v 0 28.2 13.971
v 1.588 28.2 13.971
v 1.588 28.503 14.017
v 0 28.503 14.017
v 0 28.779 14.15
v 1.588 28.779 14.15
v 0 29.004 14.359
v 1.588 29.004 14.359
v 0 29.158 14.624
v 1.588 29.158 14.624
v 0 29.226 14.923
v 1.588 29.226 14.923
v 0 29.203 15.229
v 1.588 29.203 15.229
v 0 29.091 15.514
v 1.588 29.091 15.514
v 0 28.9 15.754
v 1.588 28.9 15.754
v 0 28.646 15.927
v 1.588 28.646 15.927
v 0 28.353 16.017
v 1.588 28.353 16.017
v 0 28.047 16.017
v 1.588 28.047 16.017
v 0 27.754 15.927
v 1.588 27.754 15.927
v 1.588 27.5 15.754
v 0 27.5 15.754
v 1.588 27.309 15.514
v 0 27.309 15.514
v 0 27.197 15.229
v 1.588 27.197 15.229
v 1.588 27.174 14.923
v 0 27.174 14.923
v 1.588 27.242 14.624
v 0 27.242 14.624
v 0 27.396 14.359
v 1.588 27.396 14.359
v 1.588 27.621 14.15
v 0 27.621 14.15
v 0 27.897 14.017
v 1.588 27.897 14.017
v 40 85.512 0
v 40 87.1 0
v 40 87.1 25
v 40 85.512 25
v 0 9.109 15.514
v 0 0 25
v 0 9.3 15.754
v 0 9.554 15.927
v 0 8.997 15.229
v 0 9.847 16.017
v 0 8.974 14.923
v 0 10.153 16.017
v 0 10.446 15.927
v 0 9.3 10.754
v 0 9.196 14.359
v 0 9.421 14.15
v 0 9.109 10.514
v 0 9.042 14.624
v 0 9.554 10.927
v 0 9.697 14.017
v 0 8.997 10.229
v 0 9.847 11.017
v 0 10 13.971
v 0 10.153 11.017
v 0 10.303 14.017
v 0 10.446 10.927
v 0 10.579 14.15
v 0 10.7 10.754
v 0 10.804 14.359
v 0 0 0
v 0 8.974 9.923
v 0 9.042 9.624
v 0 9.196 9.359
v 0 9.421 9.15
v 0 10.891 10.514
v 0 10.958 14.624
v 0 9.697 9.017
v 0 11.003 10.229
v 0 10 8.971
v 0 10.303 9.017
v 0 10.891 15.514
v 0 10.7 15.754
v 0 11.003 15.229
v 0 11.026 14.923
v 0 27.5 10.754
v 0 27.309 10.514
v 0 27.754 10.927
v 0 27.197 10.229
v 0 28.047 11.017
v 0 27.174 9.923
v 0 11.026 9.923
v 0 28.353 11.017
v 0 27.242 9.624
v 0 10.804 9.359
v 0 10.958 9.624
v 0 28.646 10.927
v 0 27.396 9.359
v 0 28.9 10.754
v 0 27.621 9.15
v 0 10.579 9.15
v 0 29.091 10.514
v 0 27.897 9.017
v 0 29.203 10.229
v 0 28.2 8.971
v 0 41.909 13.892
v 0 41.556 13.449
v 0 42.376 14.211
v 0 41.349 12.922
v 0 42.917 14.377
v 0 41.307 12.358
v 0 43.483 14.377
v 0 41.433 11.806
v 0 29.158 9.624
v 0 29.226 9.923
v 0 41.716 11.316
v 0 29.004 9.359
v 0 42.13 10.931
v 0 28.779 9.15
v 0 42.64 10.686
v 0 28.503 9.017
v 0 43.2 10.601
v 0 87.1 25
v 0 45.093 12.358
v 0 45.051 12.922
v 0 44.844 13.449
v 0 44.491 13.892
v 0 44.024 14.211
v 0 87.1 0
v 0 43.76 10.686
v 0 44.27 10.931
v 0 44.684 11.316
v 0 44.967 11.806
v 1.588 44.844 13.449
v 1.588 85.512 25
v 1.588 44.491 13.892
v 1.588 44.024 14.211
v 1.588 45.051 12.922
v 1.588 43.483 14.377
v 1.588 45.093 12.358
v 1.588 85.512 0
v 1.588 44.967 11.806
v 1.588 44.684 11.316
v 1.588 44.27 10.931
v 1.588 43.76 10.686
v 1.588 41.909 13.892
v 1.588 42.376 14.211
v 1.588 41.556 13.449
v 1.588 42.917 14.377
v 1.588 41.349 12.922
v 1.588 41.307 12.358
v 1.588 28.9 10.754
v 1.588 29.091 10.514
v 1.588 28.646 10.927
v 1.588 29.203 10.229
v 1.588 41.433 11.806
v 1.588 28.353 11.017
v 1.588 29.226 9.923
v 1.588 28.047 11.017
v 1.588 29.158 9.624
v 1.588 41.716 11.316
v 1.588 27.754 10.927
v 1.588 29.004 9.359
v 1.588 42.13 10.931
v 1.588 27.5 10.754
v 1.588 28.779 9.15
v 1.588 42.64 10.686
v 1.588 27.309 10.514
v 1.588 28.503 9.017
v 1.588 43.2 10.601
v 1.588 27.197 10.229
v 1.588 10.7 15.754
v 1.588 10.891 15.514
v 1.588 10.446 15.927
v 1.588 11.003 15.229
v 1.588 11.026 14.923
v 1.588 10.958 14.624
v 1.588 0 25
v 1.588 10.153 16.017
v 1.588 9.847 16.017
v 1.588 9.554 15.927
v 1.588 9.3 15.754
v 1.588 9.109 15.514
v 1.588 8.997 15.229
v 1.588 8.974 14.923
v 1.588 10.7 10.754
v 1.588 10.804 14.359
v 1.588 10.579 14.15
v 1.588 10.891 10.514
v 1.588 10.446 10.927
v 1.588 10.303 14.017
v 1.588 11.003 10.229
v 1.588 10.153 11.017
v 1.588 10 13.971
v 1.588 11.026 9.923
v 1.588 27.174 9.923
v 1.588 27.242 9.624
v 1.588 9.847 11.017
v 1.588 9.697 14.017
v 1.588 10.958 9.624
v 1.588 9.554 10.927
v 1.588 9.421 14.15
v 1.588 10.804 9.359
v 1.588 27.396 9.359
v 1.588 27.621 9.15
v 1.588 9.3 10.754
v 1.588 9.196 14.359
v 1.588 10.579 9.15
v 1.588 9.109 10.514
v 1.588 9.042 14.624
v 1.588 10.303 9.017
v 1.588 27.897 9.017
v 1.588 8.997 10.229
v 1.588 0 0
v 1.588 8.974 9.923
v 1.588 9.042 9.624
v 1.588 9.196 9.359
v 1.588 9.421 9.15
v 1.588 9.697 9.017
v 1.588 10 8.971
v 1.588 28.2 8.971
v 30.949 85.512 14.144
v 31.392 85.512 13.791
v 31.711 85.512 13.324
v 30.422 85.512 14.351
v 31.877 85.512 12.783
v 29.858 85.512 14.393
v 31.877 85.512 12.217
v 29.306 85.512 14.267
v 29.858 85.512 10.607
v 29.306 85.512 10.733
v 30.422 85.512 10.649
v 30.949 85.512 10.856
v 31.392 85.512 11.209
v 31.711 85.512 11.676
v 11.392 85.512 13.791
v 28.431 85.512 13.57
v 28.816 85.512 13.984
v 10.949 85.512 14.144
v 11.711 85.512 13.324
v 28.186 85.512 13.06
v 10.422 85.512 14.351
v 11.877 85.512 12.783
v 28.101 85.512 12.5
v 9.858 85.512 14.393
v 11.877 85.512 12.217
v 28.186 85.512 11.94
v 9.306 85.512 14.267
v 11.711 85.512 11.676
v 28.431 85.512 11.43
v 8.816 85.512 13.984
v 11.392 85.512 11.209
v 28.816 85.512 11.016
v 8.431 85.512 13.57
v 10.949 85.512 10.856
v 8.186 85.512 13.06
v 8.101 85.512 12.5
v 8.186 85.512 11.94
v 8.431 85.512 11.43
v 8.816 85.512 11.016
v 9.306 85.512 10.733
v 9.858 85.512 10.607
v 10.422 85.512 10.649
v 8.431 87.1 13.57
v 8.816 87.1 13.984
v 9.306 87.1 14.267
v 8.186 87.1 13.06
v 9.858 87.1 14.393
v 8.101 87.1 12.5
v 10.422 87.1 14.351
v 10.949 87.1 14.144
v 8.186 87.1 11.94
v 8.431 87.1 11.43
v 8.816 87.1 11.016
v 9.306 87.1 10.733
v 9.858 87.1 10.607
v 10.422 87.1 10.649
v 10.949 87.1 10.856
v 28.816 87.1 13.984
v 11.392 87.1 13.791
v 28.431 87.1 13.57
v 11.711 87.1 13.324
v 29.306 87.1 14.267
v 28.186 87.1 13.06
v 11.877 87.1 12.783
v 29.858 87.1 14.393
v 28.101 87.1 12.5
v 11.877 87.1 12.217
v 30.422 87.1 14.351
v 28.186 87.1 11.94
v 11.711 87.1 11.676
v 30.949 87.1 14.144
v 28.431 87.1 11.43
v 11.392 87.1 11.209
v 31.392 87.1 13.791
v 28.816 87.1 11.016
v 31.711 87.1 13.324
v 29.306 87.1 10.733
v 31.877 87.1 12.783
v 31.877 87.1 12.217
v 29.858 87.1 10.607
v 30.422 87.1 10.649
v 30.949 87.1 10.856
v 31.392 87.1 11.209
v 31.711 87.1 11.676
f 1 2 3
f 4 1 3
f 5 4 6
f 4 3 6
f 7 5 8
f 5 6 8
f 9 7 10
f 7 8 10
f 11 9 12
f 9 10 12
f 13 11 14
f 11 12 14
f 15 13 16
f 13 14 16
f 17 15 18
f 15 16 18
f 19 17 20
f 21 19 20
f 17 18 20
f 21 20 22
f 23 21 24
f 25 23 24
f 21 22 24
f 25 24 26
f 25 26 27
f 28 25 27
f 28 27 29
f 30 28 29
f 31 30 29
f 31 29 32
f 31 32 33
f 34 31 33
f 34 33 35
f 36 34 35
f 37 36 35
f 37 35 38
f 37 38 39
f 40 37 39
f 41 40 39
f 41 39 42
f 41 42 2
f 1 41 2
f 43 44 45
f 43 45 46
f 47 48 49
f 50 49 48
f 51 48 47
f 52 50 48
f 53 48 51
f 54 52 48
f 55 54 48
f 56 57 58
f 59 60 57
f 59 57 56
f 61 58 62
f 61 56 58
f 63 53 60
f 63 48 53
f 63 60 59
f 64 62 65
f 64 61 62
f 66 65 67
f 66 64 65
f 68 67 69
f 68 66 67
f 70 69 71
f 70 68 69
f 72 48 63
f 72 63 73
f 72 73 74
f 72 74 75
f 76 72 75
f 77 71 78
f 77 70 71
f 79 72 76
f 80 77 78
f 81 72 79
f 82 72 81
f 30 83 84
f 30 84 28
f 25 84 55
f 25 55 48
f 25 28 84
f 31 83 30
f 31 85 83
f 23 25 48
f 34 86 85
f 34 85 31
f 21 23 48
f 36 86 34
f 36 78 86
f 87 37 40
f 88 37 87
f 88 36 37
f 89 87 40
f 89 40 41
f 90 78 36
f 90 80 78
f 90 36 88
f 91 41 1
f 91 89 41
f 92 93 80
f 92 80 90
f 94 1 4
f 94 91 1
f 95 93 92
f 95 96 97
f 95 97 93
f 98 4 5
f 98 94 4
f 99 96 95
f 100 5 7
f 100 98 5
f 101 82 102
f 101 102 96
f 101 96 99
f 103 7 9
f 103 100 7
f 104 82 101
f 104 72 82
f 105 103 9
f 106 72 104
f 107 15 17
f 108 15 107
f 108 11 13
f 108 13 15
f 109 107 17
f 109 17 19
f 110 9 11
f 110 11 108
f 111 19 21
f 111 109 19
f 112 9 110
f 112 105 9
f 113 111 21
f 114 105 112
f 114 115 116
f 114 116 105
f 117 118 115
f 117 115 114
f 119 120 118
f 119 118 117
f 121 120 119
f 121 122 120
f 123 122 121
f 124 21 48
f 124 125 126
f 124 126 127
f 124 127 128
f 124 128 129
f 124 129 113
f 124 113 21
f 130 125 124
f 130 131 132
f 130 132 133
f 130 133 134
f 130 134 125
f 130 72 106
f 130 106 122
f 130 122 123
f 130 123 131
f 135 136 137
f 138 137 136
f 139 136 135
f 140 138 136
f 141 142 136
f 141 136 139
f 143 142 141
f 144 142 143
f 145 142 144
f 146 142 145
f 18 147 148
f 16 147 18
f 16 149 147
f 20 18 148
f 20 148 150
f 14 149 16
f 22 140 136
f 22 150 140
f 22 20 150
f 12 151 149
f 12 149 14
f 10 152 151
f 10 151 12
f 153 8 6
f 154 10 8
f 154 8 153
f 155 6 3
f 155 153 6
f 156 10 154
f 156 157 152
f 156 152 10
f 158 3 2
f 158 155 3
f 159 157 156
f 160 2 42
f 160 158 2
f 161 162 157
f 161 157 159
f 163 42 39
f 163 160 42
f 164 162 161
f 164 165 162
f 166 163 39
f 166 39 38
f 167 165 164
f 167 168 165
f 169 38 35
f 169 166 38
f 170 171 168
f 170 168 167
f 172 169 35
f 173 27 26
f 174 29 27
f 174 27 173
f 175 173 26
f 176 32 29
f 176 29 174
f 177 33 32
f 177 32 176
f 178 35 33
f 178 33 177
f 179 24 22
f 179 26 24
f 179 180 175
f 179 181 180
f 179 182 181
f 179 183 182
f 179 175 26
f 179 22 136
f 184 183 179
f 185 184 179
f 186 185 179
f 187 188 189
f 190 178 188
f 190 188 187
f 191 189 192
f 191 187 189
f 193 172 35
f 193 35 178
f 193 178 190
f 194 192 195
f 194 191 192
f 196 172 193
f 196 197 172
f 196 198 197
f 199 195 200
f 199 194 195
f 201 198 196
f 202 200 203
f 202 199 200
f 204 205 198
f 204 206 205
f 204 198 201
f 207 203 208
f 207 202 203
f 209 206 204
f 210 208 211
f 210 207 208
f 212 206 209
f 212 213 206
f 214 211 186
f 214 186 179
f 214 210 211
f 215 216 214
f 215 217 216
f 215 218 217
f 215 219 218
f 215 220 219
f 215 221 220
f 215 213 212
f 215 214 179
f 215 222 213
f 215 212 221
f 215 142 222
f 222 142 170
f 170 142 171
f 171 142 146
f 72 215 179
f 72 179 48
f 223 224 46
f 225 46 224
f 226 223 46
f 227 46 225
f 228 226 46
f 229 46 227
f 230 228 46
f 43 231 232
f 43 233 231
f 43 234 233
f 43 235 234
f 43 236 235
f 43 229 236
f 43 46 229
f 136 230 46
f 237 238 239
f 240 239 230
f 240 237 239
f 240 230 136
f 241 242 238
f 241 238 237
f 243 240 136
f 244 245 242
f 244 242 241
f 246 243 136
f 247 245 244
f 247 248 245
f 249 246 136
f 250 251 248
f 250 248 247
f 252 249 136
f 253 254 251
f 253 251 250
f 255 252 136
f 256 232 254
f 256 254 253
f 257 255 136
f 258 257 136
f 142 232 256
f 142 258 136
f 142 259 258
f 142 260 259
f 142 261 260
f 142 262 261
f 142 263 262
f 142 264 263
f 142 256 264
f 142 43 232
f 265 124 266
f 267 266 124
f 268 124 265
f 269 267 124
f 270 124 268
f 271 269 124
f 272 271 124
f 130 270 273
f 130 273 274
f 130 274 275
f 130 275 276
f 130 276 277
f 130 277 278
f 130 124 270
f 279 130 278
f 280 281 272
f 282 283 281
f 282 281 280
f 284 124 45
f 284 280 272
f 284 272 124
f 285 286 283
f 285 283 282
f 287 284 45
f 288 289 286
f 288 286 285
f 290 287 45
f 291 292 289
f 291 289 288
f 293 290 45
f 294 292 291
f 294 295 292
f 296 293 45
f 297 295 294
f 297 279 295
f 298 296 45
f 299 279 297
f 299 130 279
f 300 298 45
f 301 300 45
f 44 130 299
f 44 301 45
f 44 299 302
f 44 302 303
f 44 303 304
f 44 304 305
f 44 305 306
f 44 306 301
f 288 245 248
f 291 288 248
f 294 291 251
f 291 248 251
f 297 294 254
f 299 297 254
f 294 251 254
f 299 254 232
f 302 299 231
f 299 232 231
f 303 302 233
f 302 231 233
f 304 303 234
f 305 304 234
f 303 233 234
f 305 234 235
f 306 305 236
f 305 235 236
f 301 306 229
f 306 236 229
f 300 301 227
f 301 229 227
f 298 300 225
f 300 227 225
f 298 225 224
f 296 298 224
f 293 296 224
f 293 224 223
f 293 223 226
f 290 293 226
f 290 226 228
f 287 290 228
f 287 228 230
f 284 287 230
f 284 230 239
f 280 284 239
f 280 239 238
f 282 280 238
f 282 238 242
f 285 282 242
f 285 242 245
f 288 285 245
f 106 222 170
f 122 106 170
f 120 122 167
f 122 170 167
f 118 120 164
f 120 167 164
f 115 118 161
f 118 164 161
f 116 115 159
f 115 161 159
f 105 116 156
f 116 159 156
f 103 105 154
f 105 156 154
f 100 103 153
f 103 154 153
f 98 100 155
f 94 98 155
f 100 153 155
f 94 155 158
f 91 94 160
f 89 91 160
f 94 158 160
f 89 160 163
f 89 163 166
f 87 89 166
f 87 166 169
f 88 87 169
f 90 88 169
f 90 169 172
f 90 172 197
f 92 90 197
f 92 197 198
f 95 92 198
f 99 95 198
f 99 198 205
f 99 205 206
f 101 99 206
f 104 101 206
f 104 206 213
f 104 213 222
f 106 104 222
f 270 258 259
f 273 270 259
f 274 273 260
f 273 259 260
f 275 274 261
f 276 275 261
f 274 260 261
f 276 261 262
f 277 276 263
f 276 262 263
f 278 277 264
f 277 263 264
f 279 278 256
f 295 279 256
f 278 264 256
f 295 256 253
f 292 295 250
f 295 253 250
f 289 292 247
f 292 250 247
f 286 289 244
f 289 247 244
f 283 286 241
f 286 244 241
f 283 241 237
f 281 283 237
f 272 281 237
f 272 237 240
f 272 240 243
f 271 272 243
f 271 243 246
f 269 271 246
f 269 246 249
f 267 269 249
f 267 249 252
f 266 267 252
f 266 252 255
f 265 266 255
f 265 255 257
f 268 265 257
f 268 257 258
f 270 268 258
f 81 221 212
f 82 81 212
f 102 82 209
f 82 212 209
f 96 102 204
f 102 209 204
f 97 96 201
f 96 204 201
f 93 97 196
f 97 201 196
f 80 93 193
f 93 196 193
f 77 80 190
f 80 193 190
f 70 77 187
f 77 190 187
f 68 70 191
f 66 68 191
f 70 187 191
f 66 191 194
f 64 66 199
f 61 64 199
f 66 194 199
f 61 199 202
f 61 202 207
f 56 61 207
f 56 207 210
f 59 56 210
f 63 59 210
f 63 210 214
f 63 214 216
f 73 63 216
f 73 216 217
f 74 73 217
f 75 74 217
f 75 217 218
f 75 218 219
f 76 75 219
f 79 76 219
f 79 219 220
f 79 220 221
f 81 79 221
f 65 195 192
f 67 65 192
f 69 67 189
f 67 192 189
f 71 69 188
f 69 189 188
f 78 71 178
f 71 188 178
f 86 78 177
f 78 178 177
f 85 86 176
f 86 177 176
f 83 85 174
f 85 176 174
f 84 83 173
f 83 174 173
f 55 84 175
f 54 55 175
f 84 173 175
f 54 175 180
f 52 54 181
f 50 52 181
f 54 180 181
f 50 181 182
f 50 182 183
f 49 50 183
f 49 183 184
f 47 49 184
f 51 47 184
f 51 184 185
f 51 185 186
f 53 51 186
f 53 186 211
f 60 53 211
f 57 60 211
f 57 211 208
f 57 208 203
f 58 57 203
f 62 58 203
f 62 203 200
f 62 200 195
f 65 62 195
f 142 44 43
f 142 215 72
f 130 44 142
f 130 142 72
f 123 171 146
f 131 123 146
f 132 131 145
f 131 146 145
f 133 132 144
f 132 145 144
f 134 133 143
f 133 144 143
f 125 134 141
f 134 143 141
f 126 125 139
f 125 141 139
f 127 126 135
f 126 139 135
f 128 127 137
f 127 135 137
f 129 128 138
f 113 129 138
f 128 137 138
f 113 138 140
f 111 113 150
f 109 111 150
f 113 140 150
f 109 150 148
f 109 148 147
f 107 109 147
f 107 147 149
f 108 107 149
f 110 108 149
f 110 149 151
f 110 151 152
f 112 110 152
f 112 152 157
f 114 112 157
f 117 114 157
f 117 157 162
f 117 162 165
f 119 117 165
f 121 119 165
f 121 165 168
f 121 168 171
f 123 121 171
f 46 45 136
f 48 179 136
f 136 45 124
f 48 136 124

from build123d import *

# Parameters (mm, degrees)
BOSS_EXTRUDE1_DEPTH   = 25
F_6_CLEARANCE_HOLE1_D = 3.7973
F_1_CLEARANCE_HOLE2_D = 2.0574
F_6_CLEARANCE_HOLE2_D = 3.7973


with BuildPart() as part:
    # Sketch2 → Boss-Extrude1 (new body)
    with BuildSketch(Plane.XY):
        Polygon((0, 0), (0, 87.1), (40, 87.1), (40, 85.5125), (1.5875, 85.5125), (1.5875, 0), align=None)
    extrude(amount=BOSS_EXTRUDE1_DEPTH)

    # #6 Clearance Hole1 (through all)
    with Locations(Plane(origin=(0, 87.1, 0), x_dir=(1, 0, 0), z_dir=(0, 1, 0))):
        with Locations((10, -12.5), (30, -12.5)):
            Hole(F_6_CLEARANCE_HOLE1_D / 2)

    # #1 Clearance Hole2 (through all)
    with Locations(Plane.ZY):
        with Locations((15, 10), (15, 28.2), (10, 10), (10, 28.2)):
            Hole(F_1_CLEARANCE_HOLE2_D / 2)

    # #6 Clearance Hole2 (through all)
    with Locations(Plane.ZY):
        with Locations((12.5, 43.2)):
            Hole(F_6_CLEARANCE_HOLE2_D / 2)


solid = part.part
